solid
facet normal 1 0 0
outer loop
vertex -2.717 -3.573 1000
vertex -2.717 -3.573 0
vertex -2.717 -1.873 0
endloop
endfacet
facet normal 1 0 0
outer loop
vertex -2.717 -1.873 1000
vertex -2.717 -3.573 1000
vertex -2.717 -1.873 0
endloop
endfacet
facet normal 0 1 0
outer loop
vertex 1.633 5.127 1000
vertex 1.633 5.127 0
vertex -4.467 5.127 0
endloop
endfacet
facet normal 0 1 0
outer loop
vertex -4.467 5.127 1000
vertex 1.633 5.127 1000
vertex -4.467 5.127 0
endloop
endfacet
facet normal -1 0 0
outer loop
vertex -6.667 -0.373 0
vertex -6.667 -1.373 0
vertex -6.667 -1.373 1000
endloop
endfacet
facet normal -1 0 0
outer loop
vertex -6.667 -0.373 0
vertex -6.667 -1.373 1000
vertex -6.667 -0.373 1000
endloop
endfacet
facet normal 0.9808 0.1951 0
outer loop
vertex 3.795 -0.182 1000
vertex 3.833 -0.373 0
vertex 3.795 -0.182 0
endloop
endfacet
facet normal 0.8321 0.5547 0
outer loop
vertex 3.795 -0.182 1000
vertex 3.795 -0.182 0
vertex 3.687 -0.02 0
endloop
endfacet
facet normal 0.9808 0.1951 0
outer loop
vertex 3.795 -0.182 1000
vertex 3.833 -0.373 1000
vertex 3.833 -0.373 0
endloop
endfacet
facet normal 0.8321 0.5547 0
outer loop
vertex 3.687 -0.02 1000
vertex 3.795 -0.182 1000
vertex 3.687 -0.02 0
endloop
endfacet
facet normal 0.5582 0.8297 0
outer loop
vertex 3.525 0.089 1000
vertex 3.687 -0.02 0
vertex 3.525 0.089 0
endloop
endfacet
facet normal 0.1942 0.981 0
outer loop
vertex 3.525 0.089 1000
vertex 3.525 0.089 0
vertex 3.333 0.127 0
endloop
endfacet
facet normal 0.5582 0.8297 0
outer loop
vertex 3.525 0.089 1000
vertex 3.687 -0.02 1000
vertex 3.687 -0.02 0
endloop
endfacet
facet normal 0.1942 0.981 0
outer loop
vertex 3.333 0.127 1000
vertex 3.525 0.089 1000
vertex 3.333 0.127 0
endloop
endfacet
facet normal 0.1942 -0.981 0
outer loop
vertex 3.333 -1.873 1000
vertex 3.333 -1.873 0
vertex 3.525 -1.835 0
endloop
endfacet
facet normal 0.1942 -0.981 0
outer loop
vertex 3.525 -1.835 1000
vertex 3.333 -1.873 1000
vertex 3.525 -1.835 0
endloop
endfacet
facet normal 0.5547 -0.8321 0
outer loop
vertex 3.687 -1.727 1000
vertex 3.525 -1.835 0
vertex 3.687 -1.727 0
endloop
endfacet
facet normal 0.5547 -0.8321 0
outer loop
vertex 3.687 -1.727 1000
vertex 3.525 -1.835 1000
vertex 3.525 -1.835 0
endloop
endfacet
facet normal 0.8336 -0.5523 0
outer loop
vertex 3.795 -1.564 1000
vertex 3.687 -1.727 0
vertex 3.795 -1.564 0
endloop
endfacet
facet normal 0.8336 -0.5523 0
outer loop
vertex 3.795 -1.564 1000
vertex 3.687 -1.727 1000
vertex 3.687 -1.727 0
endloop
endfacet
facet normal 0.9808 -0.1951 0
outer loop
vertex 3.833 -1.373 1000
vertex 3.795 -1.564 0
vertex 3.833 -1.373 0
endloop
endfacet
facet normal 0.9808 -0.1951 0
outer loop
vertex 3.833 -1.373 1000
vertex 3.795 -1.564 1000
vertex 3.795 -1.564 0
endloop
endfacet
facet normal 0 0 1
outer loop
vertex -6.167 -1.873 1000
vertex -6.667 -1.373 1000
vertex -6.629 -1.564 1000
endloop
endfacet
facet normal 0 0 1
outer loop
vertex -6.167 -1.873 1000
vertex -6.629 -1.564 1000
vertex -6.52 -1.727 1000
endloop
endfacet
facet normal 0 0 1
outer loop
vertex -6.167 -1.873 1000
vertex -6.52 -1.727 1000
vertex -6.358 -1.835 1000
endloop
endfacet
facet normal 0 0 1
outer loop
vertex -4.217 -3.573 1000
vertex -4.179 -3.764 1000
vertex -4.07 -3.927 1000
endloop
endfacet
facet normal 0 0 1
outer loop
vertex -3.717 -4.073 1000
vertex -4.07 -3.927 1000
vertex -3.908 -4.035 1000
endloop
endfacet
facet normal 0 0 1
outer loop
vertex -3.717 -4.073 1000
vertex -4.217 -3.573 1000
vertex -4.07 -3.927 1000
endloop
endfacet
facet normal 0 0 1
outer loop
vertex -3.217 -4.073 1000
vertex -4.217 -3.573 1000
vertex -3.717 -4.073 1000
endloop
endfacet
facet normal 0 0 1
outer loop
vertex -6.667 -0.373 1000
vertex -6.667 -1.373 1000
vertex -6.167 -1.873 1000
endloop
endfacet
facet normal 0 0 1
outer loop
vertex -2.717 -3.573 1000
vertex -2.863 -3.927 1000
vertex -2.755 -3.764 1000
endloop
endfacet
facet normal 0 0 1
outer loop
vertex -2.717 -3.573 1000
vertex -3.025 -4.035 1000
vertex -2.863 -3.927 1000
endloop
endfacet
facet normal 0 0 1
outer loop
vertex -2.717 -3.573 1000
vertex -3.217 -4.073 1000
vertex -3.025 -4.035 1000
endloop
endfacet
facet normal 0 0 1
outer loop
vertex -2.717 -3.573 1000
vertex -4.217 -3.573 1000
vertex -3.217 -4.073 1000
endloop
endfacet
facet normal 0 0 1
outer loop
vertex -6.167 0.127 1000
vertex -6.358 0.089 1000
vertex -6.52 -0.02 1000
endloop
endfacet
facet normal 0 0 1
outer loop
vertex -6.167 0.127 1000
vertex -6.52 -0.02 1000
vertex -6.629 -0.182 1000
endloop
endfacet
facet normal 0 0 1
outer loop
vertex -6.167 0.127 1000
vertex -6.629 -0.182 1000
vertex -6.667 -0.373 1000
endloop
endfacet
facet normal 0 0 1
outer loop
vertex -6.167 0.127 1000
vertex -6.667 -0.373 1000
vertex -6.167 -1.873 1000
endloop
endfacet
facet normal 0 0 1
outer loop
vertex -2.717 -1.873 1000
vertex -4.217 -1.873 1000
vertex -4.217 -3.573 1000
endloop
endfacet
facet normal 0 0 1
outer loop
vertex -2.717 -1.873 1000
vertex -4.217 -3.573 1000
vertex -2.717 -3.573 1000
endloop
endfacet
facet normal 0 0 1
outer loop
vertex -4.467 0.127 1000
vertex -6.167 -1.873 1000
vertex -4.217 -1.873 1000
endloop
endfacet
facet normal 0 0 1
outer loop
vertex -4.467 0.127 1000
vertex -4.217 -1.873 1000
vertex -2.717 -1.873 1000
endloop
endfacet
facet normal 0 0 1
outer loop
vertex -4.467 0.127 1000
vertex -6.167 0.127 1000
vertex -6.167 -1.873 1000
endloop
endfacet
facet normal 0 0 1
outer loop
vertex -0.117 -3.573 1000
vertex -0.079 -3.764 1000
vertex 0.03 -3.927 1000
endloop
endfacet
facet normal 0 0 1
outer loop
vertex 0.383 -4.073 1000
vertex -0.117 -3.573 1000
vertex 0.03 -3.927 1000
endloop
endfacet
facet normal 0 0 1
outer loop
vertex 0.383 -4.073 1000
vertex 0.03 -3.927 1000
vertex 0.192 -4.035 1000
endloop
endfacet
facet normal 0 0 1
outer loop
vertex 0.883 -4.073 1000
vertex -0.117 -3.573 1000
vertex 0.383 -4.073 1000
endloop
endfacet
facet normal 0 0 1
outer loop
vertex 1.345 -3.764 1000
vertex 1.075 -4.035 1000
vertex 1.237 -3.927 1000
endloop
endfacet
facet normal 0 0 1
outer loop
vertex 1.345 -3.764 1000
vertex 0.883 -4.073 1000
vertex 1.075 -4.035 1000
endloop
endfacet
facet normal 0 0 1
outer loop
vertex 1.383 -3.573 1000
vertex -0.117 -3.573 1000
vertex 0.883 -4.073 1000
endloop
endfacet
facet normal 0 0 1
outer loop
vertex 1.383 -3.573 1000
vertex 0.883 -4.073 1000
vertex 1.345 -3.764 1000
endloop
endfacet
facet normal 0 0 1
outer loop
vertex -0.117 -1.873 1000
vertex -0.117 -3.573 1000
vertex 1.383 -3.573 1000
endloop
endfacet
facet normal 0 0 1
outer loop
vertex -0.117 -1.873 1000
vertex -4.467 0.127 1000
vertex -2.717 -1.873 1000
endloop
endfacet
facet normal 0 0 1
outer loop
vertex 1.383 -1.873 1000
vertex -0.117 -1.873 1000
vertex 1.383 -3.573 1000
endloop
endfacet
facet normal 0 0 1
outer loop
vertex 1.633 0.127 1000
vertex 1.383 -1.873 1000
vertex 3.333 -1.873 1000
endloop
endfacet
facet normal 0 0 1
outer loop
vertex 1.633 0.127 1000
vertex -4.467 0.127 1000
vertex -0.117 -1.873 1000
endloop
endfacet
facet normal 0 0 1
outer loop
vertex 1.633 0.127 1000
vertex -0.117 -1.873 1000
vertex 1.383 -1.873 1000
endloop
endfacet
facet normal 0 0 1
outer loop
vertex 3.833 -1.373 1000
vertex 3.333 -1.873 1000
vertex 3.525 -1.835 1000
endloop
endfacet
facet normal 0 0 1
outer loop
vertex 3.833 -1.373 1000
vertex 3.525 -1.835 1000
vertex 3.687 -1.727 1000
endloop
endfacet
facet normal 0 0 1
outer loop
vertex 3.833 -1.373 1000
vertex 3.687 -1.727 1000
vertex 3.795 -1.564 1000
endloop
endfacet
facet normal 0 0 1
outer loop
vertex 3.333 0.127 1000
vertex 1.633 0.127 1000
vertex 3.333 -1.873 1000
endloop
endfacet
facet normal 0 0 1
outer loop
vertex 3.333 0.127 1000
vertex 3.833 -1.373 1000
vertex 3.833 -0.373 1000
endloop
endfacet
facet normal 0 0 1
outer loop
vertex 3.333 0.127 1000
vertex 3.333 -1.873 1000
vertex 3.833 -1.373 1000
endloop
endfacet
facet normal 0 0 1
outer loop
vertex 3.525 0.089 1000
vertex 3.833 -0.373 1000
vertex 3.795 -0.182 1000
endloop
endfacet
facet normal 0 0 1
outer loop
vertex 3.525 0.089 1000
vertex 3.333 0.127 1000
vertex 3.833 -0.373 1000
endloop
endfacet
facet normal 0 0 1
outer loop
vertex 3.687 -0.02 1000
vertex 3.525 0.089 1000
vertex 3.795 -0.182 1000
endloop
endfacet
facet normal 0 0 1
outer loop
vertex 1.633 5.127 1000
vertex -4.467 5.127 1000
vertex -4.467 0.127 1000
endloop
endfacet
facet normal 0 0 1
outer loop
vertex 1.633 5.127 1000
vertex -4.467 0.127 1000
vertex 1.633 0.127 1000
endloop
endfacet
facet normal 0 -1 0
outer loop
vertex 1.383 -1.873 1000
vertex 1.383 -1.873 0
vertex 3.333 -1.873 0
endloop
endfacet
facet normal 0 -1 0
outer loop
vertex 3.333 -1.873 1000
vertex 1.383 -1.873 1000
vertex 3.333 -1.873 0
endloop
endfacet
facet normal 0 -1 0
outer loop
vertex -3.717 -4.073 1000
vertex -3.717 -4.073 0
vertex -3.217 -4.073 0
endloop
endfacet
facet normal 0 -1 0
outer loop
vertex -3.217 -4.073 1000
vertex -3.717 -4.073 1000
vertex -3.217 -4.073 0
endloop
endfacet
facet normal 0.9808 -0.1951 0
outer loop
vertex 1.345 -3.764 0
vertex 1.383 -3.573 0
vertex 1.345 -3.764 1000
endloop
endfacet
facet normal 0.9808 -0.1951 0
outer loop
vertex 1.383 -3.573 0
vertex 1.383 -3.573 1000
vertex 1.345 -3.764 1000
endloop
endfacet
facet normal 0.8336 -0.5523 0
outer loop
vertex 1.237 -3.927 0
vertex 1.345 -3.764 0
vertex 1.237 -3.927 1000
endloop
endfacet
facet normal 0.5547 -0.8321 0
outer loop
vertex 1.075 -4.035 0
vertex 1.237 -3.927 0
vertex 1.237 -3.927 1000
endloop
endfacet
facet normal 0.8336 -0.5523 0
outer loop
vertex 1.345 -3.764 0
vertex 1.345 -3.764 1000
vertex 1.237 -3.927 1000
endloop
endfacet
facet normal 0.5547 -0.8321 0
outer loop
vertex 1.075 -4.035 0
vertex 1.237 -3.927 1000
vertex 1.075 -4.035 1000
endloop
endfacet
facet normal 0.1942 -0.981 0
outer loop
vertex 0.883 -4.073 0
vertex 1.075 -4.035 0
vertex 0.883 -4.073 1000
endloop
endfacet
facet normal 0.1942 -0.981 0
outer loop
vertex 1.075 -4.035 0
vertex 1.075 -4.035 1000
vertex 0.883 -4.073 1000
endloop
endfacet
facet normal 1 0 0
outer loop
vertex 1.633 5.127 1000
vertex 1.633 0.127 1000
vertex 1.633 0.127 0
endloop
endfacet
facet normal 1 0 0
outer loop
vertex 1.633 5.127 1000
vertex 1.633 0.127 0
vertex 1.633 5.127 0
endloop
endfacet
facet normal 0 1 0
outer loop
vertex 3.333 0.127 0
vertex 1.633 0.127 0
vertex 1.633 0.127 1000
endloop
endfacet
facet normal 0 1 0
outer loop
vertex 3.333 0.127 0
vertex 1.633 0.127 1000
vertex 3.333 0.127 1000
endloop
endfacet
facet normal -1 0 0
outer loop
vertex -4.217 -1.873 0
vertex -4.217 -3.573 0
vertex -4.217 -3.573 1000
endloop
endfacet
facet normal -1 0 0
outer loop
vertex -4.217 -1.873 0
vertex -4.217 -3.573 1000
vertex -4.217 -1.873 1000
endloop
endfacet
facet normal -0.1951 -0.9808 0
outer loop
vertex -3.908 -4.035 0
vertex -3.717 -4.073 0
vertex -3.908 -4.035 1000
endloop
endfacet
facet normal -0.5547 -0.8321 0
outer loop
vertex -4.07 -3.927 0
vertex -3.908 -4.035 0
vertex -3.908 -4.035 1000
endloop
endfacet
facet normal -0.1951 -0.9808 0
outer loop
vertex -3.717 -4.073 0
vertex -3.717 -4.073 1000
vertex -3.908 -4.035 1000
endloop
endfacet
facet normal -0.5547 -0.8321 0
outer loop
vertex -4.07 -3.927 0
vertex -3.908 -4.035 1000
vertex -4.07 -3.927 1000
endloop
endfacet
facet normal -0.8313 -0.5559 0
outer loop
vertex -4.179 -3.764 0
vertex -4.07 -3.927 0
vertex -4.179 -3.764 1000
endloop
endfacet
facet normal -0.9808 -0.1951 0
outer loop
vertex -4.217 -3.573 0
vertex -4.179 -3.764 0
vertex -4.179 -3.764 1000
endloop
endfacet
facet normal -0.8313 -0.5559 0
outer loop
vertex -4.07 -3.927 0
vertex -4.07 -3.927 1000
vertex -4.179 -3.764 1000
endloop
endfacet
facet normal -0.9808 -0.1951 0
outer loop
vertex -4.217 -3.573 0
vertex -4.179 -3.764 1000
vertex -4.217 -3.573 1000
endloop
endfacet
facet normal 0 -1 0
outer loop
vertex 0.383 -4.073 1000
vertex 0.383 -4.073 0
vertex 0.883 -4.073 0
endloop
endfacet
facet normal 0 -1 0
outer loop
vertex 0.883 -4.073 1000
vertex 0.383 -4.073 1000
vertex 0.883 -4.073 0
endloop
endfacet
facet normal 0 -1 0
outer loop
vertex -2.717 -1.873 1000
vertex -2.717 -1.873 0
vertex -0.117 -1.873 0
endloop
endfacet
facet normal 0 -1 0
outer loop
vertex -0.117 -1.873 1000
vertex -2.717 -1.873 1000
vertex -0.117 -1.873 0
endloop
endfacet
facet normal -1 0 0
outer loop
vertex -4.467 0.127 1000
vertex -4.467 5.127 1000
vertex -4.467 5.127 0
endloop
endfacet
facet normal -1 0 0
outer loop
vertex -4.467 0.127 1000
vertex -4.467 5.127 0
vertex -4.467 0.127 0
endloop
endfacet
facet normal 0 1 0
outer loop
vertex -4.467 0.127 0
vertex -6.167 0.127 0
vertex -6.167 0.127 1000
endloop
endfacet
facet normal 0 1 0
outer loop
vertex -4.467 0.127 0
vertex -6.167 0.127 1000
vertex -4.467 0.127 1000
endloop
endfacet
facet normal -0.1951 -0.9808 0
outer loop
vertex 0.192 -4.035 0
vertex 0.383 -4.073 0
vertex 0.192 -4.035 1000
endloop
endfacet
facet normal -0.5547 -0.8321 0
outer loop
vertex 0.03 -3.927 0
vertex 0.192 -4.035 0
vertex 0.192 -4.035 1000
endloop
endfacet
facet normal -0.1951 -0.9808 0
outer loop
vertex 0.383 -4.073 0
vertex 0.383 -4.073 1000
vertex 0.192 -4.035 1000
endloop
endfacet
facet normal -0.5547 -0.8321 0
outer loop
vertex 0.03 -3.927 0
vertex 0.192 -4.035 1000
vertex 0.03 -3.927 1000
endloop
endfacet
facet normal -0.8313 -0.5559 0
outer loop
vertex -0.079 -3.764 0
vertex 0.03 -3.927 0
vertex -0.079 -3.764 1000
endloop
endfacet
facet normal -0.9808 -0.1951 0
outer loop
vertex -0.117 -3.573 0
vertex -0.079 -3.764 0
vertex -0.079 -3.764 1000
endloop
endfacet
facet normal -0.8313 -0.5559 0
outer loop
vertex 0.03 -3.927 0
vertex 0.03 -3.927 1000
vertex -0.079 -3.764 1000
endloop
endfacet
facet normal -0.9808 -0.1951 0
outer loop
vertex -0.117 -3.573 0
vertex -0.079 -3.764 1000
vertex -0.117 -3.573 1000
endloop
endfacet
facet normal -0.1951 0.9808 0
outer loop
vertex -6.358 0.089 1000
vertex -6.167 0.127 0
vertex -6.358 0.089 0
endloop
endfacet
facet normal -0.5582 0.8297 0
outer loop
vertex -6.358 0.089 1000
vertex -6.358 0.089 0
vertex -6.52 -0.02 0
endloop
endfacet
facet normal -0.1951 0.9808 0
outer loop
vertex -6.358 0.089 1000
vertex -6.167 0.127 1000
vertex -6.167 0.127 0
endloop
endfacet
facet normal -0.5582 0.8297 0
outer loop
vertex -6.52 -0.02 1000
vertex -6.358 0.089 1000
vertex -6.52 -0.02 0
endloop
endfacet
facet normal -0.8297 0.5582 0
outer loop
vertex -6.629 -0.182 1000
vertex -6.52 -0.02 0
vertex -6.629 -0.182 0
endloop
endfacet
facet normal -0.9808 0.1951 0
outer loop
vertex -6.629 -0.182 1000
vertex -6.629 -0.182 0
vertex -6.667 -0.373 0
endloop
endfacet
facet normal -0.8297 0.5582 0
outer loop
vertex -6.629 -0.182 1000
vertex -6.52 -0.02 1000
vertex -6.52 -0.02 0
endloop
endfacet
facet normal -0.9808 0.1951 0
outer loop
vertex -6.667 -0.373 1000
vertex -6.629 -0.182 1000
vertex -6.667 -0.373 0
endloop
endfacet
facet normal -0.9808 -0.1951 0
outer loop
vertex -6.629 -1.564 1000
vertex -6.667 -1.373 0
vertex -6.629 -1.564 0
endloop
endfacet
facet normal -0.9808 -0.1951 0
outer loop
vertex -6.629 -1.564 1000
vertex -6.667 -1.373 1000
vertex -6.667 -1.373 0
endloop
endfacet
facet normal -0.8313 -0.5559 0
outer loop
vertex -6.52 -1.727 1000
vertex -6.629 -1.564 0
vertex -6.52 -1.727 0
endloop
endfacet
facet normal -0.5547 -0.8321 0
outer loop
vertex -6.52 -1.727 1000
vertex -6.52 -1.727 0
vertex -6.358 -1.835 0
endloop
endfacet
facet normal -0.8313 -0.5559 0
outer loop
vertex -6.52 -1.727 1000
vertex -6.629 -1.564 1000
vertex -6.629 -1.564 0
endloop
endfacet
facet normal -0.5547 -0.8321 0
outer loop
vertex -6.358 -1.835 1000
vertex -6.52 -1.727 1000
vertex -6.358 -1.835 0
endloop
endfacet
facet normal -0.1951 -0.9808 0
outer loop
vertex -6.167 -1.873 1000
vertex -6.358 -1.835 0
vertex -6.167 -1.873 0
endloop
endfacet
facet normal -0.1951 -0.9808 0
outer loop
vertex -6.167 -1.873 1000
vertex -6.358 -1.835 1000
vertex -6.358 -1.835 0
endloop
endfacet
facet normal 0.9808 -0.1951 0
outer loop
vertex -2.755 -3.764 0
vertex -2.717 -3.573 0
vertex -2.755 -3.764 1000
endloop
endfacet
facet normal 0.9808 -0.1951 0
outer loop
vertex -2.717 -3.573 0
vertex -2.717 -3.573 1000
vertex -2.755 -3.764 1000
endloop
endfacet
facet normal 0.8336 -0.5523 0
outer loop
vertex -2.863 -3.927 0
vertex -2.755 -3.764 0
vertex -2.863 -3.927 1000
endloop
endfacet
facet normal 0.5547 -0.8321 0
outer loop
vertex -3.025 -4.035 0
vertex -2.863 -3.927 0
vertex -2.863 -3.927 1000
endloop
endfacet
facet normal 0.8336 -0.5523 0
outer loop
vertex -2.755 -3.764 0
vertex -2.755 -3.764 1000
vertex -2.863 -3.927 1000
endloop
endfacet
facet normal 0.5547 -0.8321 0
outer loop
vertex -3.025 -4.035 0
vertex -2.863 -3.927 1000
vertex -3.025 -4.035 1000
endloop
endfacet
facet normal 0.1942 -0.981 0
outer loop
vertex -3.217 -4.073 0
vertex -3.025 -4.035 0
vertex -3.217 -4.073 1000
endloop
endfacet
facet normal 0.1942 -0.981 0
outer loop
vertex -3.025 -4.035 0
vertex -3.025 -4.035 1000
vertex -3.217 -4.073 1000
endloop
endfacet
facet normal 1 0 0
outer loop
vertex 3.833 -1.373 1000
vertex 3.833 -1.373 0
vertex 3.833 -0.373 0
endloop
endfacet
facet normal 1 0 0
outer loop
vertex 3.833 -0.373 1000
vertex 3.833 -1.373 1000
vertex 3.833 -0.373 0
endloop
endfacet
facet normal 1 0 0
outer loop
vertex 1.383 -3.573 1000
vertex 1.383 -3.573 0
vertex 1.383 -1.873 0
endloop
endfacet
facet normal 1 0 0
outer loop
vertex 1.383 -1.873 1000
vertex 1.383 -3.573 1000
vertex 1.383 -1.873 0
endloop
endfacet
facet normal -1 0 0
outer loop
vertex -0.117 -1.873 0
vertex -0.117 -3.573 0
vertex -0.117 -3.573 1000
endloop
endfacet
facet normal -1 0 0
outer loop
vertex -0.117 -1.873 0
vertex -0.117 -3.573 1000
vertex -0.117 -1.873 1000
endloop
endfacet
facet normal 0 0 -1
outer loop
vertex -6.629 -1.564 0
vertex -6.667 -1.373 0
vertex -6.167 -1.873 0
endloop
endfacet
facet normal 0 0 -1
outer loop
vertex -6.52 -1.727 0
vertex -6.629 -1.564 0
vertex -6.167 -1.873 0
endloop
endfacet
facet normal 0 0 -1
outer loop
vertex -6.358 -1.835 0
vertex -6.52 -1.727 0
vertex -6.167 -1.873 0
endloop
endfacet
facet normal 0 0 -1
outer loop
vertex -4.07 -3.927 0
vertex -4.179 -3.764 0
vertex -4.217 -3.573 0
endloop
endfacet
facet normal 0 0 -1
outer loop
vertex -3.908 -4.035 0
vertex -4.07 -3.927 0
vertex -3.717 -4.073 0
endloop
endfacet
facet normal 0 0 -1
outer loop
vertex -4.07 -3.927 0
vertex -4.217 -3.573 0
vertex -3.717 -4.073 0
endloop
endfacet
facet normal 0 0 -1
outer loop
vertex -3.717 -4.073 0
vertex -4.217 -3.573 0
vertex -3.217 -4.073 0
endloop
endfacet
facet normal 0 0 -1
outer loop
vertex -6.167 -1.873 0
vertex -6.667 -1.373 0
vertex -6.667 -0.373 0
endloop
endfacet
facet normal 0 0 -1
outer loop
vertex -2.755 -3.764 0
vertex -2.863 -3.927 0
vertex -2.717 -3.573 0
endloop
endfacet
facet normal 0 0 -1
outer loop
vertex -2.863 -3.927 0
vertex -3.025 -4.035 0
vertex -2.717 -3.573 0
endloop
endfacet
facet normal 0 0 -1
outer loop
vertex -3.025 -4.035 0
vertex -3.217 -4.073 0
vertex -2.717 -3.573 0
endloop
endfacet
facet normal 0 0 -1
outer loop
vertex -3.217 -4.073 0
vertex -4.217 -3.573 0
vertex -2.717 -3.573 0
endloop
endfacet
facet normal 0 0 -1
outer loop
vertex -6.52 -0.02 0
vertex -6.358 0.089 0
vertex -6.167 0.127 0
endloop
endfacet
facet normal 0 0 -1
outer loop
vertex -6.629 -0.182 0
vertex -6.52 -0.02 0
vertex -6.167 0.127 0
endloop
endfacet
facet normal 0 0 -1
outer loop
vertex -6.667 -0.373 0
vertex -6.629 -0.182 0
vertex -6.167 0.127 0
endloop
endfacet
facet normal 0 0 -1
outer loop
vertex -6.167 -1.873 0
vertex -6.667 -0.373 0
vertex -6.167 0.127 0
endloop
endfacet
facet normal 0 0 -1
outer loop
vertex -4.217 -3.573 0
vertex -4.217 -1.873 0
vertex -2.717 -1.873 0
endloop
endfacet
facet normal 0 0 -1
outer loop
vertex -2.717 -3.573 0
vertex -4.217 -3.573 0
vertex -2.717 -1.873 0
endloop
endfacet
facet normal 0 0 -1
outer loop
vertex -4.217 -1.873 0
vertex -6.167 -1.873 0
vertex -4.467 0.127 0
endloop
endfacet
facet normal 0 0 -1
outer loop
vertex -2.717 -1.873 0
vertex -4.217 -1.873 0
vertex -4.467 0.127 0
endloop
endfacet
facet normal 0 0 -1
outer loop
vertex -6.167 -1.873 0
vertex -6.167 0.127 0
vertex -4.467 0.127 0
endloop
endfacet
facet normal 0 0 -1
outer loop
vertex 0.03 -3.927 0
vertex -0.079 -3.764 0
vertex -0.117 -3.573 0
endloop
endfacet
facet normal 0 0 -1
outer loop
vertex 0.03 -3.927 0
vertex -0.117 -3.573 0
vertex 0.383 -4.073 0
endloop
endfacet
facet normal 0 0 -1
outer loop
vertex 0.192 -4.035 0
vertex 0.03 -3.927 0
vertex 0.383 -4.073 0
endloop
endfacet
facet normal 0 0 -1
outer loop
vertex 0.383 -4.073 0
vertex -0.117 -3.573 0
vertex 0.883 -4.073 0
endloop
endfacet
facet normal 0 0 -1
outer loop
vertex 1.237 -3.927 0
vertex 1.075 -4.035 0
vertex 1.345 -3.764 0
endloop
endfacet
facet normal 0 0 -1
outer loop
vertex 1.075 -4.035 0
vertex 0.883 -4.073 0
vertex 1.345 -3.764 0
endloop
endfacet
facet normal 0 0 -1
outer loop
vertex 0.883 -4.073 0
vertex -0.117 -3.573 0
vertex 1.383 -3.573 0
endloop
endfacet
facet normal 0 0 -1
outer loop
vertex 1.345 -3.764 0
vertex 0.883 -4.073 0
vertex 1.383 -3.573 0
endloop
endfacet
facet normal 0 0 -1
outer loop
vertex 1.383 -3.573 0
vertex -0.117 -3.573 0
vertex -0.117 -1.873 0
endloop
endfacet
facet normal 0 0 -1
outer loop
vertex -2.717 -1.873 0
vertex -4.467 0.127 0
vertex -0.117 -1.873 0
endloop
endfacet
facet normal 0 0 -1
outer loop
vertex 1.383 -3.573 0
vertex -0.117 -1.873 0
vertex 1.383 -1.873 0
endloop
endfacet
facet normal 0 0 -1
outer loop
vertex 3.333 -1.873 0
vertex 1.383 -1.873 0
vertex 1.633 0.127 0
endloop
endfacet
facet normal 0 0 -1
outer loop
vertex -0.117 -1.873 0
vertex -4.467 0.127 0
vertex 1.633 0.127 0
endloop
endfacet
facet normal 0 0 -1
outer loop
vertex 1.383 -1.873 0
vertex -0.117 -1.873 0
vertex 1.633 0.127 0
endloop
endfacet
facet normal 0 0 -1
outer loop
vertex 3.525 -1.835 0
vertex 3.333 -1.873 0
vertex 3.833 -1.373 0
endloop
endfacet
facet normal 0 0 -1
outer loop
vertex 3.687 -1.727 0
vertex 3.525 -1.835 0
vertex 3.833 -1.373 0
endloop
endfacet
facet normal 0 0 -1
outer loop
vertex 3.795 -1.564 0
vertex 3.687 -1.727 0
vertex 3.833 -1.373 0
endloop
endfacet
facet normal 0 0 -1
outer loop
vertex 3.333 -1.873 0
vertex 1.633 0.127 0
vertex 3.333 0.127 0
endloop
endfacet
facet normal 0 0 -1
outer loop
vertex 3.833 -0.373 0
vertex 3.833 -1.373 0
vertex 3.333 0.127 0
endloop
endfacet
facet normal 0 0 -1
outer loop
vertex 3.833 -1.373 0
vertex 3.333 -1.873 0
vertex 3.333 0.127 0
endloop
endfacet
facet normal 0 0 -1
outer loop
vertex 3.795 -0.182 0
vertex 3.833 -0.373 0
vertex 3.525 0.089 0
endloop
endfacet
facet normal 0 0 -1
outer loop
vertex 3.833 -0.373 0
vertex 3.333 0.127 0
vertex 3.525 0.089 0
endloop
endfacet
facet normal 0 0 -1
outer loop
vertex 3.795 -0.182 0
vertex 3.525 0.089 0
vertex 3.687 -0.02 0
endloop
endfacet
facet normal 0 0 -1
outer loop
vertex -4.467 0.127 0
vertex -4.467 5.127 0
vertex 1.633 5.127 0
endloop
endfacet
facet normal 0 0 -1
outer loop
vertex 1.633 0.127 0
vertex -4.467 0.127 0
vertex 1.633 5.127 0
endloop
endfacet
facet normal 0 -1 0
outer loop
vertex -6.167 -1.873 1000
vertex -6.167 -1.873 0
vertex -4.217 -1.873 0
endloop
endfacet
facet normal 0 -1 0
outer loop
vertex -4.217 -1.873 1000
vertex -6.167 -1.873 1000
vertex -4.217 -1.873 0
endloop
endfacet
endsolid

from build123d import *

# Parameters (mm, degrees)
SKETCH2_W           = 3.05
SKETCH2_H           = 2.25
SKETCH2_W_2         = 2.2
SKETCH2_H_2         = 2
SKETCH2_W_3         = 1.5
SKETCH2_H_3         = 2.2
BOSS_EXTRUDE1_DEPTH = 1000
FILLET1_R           = 0.5
FILLET2_R           = 0.5


with BuildPart() as part:
    # Sketch2 → Boss-Extrude1 (new body)
    with BuildSketch(Plane.XY):
        with Locations((0.108353761, 4.001842427)):
            Rectangle(SKETCH2_W, SKETCH2_H)
        Polygon((-1.416646239, -1.873157573), (-1.416646239, 2.876842427), (-4.466646239, 2.876842427), (-4.466646239, 0.126842427), (-4.466646239, -1.873157573), (-4.216646239, -1.873157573), (-2.716646239, -1.873157573), align=None)
        Polygon((1.633353761, 2.876842427), (-1.416646239, 2.876842427), (-1.416646239, -1.873157573), (-0.116646239, -1.873157573), (1.383353761, -1.873157573), (1.633353761, -1.873157573), (1.633353761, 0.126842427), align=None)
        with Locations((-2.941646239, 4.001842427)):
            Rectangle(SKETCH2_W, SKETCH2_H)
        with Locations((2.733353761, -0.873157573)):
            Rectangle(SKETCH2_W_2, SKETCH2_H_2)
        with Locations((0.633353761, -2.973157573)):
            Rectangle(SKETCH2_W_3, SKETCH2_H_3)
        with Locations((-3.466646239, -2.973157573)):
            Rectangle(SKETCH2_W_3, SKETCH2_H_3)
        with Locations((-5.566646239, -0.873157573)):
            Rectangle(SKETCH2_W_2, SKETCH2_H_2)
    extrude(amount=BOSS_EXTRUDE1_DEPTH)

    # Fillet1
    fillet1_edges = [part.edges().sort_by_distance(p)[0] for p in [
        (3.833353761, 0.126842427, 500),
        (3.833353761, -1.873157573, 500),
        (-6.666646239, -1.873157573, 500),
        (-6.666646239, 0.126842427, 500),
    ]]
    fillet(fillet1_edges, radius=FILLET1_R)

    # Fillet2
    fillet2_edges = [part.edges().sort_by_distance(p)[0] for p in [
        (1.383353761, -4.073157573, 500),
        (-0.116646239, -4.073157573, 500),
        (-2.716646239, -4.073157573, 500),
        (-4.216646239, -4.073157573, 500),
    ]]
    fillet(fillet2_edges, radius=FILLET2_R)


solid = part.part
